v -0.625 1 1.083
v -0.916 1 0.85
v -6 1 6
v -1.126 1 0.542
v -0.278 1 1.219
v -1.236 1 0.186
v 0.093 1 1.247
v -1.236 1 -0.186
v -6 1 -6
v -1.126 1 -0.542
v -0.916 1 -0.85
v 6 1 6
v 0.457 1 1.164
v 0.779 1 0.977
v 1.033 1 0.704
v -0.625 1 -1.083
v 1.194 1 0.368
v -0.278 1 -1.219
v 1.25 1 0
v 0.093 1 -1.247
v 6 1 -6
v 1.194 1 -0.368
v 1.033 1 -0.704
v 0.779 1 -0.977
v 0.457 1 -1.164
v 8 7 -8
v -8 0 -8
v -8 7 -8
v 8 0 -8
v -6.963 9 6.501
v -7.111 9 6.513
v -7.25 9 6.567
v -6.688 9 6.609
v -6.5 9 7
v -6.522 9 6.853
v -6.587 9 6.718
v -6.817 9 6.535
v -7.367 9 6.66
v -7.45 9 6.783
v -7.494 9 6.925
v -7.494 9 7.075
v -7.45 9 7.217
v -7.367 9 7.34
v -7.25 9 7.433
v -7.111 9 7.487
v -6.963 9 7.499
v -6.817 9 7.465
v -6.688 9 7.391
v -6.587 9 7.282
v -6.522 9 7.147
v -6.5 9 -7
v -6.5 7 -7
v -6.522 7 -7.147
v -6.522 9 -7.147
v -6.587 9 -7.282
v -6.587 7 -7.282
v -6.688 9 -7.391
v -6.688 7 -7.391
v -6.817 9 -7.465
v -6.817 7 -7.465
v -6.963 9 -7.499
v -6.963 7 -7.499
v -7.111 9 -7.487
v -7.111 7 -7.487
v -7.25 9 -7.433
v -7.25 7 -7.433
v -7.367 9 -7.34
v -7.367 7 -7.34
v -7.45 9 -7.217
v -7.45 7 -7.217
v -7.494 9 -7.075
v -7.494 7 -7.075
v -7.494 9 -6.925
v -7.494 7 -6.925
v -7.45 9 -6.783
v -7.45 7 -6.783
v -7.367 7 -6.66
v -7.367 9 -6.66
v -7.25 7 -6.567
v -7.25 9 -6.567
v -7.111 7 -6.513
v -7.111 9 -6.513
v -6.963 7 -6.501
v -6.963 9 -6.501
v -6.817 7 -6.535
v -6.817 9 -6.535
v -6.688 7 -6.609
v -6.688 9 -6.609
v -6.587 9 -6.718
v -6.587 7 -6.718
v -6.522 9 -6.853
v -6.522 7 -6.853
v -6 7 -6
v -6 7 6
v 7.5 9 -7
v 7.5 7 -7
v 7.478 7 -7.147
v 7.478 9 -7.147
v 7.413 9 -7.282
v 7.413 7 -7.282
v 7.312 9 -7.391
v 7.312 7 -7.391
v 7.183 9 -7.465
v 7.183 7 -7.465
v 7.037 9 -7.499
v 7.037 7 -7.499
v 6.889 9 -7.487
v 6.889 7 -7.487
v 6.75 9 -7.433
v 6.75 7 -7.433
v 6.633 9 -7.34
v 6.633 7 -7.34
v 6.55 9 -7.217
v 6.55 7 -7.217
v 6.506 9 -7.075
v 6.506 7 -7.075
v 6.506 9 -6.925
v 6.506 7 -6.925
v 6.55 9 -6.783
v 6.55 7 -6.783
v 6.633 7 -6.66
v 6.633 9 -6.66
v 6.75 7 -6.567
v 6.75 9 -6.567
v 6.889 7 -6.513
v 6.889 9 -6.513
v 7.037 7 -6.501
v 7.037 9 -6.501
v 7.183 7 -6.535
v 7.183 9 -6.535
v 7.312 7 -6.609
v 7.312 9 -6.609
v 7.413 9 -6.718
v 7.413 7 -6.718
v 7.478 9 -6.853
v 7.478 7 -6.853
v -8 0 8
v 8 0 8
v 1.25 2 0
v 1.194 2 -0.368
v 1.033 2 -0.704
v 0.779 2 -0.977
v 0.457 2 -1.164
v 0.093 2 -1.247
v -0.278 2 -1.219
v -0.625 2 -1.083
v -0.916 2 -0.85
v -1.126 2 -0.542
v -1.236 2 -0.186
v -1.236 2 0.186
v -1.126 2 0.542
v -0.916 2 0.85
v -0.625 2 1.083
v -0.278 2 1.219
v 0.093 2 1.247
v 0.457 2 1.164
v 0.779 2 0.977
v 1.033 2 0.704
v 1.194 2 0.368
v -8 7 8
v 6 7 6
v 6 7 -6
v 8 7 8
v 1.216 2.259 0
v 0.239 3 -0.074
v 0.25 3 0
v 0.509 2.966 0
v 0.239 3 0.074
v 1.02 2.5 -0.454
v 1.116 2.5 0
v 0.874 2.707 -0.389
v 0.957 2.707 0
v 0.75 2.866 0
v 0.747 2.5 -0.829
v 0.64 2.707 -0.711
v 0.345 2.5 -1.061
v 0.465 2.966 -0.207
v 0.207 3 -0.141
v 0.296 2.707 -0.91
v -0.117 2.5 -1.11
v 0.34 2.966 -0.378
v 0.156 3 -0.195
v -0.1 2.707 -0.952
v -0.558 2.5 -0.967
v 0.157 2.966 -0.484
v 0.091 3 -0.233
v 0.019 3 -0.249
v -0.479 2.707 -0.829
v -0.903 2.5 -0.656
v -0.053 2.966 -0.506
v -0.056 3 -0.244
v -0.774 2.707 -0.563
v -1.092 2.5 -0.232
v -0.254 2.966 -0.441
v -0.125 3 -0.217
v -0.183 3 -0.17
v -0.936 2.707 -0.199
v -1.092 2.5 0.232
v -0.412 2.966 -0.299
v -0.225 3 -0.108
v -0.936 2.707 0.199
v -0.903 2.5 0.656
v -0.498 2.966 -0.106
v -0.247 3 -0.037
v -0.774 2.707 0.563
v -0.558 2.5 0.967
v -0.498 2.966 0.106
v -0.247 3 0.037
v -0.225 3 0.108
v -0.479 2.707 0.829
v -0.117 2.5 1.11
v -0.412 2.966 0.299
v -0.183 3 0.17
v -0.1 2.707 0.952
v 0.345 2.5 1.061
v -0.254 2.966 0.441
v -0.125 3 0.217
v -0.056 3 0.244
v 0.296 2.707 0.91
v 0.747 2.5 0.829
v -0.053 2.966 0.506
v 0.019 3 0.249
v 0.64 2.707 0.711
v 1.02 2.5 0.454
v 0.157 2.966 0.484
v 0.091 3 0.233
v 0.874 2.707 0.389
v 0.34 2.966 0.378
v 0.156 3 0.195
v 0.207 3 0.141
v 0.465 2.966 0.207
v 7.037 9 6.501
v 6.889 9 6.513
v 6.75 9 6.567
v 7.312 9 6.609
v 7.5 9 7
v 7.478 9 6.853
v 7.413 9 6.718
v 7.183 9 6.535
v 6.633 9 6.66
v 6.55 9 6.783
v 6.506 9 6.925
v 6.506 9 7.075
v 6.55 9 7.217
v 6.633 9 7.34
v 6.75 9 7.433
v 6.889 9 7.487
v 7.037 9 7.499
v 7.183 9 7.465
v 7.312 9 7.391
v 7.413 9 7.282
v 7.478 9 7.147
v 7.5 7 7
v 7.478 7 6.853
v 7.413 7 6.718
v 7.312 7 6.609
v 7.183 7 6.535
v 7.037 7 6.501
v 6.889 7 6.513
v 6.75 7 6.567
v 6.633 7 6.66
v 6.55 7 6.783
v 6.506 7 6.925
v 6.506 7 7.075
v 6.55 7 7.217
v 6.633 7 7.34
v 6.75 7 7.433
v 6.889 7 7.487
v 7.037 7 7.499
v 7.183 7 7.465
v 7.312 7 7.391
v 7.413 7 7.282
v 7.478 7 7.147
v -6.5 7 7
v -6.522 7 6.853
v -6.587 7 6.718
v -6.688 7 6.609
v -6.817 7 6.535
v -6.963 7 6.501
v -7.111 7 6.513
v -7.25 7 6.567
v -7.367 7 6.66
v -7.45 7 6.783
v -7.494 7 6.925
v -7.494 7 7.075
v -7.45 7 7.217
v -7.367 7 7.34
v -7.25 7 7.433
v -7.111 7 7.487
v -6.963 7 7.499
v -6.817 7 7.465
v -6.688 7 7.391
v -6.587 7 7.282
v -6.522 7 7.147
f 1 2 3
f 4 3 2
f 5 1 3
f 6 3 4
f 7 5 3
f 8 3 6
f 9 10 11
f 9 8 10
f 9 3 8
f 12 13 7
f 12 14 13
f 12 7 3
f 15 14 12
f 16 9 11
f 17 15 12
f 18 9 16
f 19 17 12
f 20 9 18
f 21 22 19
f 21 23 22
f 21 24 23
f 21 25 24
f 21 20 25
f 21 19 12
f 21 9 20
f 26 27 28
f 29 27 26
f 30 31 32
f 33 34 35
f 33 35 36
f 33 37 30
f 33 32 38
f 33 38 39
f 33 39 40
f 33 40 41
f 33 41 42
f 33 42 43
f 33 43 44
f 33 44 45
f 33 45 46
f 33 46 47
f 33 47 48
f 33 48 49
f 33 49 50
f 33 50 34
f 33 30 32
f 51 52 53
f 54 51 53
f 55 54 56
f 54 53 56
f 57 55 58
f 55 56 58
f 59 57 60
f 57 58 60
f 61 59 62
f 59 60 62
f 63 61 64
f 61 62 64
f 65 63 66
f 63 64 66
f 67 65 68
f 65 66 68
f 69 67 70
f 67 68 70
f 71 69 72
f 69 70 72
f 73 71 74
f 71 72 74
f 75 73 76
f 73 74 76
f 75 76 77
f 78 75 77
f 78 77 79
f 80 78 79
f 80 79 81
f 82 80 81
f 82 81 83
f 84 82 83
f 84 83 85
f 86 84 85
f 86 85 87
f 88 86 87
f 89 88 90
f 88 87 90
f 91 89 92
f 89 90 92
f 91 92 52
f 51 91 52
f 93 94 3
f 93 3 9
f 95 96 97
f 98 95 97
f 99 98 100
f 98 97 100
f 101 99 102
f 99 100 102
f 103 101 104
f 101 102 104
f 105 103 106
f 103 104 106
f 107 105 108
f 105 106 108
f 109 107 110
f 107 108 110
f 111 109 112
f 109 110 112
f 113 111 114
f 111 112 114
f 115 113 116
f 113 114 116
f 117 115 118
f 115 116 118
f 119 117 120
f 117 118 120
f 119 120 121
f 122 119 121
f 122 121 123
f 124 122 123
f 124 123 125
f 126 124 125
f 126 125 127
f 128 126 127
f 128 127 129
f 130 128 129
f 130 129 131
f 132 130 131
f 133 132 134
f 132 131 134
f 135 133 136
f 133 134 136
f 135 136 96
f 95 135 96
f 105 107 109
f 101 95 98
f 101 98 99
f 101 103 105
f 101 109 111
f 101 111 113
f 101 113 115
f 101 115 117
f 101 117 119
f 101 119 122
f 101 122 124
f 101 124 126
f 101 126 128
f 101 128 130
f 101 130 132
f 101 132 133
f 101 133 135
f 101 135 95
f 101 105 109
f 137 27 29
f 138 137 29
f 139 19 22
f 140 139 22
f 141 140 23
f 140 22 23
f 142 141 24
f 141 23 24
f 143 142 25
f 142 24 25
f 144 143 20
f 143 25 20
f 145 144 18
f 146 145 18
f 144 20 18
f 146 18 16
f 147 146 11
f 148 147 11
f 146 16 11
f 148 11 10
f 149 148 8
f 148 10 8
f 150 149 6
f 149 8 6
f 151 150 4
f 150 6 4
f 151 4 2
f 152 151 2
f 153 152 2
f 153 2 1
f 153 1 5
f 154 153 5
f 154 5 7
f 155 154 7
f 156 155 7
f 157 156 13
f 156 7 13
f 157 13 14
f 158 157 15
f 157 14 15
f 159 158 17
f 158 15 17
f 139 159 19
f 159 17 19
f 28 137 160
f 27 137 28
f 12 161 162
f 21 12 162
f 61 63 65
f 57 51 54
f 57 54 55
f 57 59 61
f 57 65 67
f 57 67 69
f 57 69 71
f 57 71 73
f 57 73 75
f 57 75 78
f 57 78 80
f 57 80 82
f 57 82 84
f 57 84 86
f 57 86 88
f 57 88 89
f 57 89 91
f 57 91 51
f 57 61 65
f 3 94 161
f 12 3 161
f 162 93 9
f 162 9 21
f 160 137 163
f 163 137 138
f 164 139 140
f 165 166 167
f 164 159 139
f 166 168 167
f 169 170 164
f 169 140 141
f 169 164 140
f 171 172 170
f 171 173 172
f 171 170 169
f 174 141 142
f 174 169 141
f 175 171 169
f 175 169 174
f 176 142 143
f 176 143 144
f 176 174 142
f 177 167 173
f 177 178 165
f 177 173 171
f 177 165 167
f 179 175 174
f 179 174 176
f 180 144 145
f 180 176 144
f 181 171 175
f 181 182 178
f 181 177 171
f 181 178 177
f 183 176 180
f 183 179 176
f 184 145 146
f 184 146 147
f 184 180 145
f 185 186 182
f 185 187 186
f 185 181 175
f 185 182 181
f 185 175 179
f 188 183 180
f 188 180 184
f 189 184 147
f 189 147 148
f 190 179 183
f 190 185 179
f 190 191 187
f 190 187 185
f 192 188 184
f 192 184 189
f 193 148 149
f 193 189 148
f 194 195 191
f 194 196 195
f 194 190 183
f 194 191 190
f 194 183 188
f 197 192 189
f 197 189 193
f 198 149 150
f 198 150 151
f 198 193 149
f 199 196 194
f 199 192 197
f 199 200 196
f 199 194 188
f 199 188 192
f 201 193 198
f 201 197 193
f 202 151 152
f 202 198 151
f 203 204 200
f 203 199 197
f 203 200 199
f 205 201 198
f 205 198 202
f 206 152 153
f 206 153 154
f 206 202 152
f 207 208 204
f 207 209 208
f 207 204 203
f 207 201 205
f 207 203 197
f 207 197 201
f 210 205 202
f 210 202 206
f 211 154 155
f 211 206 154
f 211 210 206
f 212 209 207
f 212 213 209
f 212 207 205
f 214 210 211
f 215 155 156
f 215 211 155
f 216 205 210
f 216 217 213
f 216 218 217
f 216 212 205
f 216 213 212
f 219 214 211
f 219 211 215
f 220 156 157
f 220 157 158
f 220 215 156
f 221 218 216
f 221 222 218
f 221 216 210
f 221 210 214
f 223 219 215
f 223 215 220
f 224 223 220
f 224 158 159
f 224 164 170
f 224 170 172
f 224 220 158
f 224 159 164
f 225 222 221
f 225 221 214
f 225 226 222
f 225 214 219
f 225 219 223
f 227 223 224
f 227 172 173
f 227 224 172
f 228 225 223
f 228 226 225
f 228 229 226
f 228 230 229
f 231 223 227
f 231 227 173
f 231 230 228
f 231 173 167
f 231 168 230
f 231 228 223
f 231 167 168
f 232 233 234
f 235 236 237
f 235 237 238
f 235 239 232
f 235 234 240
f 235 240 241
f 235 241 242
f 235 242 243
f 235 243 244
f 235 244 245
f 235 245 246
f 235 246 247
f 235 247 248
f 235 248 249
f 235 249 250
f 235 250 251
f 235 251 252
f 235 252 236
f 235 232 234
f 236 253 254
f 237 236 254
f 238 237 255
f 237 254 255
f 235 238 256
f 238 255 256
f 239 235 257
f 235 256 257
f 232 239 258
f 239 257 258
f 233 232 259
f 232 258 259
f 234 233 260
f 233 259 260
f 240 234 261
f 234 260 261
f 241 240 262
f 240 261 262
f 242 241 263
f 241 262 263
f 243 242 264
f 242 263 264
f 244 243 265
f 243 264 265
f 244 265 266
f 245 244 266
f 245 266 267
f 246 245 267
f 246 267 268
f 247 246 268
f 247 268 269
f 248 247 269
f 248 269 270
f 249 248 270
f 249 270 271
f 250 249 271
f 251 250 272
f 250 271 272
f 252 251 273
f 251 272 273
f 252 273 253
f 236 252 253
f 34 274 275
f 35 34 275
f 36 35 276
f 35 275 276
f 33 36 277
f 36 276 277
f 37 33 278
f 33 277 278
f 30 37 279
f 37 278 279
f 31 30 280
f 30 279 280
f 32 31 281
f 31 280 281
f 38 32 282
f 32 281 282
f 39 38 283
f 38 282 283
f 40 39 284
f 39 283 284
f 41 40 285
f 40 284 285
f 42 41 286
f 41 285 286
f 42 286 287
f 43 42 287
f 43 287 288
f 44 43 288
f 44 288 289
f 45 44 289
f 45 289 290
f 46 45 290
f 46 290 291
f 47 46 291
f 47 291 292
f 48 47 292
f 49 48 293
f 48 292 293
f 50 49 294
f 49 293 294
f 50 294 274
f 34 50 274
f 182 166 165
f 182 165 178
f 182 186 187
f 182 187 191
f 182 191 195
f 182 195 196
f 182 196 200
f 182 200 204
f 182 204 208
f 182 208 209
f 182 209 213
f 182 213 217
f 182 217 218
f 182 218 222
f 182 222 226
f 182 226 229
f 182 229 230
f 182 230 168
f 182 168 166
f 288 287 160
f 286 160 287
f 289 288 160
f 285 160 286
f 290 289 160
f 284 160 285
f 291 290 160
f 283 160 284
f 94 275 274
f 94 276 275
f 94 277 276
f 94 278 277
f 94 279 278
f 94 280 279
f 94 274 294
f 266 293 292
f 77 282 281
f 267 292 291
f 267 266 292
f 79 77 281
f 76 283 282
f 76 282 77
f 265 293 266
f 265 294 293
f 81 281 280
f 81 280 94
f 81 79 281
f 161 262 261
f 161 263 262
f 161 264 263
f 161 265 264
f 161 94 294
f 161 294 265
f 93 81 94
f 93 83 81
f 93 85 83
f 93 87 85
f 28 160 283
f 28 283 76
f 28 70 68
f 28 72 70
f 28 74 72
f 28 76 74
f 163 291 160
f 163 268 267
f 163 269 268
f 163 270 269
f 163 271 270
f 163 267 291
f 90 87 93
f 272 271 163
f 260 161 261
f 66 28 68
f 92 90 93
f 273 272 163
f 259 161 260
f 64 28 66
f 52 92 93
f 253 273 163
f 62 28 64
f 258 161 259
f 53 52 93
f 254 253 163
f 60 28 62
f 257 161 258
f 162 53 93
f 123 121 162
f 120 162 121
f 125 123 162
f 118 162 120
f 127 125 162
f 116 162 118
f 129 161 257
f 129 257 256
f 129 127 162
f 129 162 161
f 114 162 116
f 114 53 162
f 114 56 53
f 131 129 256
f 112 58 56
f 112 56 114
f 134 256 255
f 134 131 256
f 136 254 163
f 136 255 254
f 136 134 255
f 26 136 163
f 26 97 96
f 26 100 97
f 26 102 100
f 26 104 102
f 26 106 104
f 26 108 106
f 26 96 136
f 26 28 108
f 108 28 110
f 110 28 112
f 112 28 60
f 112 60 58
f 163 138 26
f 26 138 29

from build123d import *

# Parameters (mm, degrees)
SKETCH1_W           = 16
SKETCH1_H           = 16
BOSS_EXTRUDE1_DEPTH = 7
SKETCH2_W           = 12
SKETCH2_H           = 12
CUT_EXTRUDE1_DEPTH  = 6
SKETCH3_R           = 1.25
BOSS_EXTRUDE2_DEPTH = 2
FILLET1_R           = 1
SKETCH4_R           = 0.5
BOSS_EXTRUDE3_DEPTH = 2


with BuildPart() as part:
    # Sketch1 → Boss-Extrude1 (new body)
    with BuildSketch(Plane(origin=(0, 0, 0), x_dir=(1, 0, 0), z_dir=(0, 1, 0))):
        Rectangle(SKETCH1_W, SKETCH1_H)
    extrude(amount=BOSS_EXTRUDE1_DEPTH)

    # Sketch2 → Cut-Extrude1 (cut)
    with BuildSketch(Plane(origin=(0, 7, 0), x_dir=(1, 0, 0), z_dir=(0, 1, 0))):
        Rectangle(SKETCH2_W, SKETCH2_H)
    extrude(amount=-CUT_EXTRUDE1_DEPTH, mode=Mode.SUBTRACT)

    # Sketch3 → Boss-Extrude2 (add)
    with BuildSketch(Plane(origin=(0, 1, 0), x_dir=(1, 0, 0), z_dir=(0, 1, 0))):
        Circle(SKETCH3_R)
    extrude(amount=BOSS_EXTRUDE2_DEPTH)

    # Fillet1
    fillet1_edges = [part.edges().sort_by_distance(p)[0] for p in [
        (-1.25, 3, 0),
    ]]
    fillet(fillet1_edges, radius=FILLET1_R)

    # Sketch4 → Boss-Extrude3 (add)
    with BuildSketch(Plane(origin=(0, 7, 0), x_dir=(1, 0, 0), z_dir=(0, 1, 0))):
        with Locations((-7, 7)):
            Circle(SKETCH4_R)
        with Locations((7, 7)):
            Circle(SKETCH4_R)
        with Locations((7, -7)):
            Circle(SKETCH4_R)
        with Locations((-7, -7)):
            Circle(SKETCH4_R)
    extrude(amount=BOSS_EXTRUDE3_DEPTH)


solid = part.part
